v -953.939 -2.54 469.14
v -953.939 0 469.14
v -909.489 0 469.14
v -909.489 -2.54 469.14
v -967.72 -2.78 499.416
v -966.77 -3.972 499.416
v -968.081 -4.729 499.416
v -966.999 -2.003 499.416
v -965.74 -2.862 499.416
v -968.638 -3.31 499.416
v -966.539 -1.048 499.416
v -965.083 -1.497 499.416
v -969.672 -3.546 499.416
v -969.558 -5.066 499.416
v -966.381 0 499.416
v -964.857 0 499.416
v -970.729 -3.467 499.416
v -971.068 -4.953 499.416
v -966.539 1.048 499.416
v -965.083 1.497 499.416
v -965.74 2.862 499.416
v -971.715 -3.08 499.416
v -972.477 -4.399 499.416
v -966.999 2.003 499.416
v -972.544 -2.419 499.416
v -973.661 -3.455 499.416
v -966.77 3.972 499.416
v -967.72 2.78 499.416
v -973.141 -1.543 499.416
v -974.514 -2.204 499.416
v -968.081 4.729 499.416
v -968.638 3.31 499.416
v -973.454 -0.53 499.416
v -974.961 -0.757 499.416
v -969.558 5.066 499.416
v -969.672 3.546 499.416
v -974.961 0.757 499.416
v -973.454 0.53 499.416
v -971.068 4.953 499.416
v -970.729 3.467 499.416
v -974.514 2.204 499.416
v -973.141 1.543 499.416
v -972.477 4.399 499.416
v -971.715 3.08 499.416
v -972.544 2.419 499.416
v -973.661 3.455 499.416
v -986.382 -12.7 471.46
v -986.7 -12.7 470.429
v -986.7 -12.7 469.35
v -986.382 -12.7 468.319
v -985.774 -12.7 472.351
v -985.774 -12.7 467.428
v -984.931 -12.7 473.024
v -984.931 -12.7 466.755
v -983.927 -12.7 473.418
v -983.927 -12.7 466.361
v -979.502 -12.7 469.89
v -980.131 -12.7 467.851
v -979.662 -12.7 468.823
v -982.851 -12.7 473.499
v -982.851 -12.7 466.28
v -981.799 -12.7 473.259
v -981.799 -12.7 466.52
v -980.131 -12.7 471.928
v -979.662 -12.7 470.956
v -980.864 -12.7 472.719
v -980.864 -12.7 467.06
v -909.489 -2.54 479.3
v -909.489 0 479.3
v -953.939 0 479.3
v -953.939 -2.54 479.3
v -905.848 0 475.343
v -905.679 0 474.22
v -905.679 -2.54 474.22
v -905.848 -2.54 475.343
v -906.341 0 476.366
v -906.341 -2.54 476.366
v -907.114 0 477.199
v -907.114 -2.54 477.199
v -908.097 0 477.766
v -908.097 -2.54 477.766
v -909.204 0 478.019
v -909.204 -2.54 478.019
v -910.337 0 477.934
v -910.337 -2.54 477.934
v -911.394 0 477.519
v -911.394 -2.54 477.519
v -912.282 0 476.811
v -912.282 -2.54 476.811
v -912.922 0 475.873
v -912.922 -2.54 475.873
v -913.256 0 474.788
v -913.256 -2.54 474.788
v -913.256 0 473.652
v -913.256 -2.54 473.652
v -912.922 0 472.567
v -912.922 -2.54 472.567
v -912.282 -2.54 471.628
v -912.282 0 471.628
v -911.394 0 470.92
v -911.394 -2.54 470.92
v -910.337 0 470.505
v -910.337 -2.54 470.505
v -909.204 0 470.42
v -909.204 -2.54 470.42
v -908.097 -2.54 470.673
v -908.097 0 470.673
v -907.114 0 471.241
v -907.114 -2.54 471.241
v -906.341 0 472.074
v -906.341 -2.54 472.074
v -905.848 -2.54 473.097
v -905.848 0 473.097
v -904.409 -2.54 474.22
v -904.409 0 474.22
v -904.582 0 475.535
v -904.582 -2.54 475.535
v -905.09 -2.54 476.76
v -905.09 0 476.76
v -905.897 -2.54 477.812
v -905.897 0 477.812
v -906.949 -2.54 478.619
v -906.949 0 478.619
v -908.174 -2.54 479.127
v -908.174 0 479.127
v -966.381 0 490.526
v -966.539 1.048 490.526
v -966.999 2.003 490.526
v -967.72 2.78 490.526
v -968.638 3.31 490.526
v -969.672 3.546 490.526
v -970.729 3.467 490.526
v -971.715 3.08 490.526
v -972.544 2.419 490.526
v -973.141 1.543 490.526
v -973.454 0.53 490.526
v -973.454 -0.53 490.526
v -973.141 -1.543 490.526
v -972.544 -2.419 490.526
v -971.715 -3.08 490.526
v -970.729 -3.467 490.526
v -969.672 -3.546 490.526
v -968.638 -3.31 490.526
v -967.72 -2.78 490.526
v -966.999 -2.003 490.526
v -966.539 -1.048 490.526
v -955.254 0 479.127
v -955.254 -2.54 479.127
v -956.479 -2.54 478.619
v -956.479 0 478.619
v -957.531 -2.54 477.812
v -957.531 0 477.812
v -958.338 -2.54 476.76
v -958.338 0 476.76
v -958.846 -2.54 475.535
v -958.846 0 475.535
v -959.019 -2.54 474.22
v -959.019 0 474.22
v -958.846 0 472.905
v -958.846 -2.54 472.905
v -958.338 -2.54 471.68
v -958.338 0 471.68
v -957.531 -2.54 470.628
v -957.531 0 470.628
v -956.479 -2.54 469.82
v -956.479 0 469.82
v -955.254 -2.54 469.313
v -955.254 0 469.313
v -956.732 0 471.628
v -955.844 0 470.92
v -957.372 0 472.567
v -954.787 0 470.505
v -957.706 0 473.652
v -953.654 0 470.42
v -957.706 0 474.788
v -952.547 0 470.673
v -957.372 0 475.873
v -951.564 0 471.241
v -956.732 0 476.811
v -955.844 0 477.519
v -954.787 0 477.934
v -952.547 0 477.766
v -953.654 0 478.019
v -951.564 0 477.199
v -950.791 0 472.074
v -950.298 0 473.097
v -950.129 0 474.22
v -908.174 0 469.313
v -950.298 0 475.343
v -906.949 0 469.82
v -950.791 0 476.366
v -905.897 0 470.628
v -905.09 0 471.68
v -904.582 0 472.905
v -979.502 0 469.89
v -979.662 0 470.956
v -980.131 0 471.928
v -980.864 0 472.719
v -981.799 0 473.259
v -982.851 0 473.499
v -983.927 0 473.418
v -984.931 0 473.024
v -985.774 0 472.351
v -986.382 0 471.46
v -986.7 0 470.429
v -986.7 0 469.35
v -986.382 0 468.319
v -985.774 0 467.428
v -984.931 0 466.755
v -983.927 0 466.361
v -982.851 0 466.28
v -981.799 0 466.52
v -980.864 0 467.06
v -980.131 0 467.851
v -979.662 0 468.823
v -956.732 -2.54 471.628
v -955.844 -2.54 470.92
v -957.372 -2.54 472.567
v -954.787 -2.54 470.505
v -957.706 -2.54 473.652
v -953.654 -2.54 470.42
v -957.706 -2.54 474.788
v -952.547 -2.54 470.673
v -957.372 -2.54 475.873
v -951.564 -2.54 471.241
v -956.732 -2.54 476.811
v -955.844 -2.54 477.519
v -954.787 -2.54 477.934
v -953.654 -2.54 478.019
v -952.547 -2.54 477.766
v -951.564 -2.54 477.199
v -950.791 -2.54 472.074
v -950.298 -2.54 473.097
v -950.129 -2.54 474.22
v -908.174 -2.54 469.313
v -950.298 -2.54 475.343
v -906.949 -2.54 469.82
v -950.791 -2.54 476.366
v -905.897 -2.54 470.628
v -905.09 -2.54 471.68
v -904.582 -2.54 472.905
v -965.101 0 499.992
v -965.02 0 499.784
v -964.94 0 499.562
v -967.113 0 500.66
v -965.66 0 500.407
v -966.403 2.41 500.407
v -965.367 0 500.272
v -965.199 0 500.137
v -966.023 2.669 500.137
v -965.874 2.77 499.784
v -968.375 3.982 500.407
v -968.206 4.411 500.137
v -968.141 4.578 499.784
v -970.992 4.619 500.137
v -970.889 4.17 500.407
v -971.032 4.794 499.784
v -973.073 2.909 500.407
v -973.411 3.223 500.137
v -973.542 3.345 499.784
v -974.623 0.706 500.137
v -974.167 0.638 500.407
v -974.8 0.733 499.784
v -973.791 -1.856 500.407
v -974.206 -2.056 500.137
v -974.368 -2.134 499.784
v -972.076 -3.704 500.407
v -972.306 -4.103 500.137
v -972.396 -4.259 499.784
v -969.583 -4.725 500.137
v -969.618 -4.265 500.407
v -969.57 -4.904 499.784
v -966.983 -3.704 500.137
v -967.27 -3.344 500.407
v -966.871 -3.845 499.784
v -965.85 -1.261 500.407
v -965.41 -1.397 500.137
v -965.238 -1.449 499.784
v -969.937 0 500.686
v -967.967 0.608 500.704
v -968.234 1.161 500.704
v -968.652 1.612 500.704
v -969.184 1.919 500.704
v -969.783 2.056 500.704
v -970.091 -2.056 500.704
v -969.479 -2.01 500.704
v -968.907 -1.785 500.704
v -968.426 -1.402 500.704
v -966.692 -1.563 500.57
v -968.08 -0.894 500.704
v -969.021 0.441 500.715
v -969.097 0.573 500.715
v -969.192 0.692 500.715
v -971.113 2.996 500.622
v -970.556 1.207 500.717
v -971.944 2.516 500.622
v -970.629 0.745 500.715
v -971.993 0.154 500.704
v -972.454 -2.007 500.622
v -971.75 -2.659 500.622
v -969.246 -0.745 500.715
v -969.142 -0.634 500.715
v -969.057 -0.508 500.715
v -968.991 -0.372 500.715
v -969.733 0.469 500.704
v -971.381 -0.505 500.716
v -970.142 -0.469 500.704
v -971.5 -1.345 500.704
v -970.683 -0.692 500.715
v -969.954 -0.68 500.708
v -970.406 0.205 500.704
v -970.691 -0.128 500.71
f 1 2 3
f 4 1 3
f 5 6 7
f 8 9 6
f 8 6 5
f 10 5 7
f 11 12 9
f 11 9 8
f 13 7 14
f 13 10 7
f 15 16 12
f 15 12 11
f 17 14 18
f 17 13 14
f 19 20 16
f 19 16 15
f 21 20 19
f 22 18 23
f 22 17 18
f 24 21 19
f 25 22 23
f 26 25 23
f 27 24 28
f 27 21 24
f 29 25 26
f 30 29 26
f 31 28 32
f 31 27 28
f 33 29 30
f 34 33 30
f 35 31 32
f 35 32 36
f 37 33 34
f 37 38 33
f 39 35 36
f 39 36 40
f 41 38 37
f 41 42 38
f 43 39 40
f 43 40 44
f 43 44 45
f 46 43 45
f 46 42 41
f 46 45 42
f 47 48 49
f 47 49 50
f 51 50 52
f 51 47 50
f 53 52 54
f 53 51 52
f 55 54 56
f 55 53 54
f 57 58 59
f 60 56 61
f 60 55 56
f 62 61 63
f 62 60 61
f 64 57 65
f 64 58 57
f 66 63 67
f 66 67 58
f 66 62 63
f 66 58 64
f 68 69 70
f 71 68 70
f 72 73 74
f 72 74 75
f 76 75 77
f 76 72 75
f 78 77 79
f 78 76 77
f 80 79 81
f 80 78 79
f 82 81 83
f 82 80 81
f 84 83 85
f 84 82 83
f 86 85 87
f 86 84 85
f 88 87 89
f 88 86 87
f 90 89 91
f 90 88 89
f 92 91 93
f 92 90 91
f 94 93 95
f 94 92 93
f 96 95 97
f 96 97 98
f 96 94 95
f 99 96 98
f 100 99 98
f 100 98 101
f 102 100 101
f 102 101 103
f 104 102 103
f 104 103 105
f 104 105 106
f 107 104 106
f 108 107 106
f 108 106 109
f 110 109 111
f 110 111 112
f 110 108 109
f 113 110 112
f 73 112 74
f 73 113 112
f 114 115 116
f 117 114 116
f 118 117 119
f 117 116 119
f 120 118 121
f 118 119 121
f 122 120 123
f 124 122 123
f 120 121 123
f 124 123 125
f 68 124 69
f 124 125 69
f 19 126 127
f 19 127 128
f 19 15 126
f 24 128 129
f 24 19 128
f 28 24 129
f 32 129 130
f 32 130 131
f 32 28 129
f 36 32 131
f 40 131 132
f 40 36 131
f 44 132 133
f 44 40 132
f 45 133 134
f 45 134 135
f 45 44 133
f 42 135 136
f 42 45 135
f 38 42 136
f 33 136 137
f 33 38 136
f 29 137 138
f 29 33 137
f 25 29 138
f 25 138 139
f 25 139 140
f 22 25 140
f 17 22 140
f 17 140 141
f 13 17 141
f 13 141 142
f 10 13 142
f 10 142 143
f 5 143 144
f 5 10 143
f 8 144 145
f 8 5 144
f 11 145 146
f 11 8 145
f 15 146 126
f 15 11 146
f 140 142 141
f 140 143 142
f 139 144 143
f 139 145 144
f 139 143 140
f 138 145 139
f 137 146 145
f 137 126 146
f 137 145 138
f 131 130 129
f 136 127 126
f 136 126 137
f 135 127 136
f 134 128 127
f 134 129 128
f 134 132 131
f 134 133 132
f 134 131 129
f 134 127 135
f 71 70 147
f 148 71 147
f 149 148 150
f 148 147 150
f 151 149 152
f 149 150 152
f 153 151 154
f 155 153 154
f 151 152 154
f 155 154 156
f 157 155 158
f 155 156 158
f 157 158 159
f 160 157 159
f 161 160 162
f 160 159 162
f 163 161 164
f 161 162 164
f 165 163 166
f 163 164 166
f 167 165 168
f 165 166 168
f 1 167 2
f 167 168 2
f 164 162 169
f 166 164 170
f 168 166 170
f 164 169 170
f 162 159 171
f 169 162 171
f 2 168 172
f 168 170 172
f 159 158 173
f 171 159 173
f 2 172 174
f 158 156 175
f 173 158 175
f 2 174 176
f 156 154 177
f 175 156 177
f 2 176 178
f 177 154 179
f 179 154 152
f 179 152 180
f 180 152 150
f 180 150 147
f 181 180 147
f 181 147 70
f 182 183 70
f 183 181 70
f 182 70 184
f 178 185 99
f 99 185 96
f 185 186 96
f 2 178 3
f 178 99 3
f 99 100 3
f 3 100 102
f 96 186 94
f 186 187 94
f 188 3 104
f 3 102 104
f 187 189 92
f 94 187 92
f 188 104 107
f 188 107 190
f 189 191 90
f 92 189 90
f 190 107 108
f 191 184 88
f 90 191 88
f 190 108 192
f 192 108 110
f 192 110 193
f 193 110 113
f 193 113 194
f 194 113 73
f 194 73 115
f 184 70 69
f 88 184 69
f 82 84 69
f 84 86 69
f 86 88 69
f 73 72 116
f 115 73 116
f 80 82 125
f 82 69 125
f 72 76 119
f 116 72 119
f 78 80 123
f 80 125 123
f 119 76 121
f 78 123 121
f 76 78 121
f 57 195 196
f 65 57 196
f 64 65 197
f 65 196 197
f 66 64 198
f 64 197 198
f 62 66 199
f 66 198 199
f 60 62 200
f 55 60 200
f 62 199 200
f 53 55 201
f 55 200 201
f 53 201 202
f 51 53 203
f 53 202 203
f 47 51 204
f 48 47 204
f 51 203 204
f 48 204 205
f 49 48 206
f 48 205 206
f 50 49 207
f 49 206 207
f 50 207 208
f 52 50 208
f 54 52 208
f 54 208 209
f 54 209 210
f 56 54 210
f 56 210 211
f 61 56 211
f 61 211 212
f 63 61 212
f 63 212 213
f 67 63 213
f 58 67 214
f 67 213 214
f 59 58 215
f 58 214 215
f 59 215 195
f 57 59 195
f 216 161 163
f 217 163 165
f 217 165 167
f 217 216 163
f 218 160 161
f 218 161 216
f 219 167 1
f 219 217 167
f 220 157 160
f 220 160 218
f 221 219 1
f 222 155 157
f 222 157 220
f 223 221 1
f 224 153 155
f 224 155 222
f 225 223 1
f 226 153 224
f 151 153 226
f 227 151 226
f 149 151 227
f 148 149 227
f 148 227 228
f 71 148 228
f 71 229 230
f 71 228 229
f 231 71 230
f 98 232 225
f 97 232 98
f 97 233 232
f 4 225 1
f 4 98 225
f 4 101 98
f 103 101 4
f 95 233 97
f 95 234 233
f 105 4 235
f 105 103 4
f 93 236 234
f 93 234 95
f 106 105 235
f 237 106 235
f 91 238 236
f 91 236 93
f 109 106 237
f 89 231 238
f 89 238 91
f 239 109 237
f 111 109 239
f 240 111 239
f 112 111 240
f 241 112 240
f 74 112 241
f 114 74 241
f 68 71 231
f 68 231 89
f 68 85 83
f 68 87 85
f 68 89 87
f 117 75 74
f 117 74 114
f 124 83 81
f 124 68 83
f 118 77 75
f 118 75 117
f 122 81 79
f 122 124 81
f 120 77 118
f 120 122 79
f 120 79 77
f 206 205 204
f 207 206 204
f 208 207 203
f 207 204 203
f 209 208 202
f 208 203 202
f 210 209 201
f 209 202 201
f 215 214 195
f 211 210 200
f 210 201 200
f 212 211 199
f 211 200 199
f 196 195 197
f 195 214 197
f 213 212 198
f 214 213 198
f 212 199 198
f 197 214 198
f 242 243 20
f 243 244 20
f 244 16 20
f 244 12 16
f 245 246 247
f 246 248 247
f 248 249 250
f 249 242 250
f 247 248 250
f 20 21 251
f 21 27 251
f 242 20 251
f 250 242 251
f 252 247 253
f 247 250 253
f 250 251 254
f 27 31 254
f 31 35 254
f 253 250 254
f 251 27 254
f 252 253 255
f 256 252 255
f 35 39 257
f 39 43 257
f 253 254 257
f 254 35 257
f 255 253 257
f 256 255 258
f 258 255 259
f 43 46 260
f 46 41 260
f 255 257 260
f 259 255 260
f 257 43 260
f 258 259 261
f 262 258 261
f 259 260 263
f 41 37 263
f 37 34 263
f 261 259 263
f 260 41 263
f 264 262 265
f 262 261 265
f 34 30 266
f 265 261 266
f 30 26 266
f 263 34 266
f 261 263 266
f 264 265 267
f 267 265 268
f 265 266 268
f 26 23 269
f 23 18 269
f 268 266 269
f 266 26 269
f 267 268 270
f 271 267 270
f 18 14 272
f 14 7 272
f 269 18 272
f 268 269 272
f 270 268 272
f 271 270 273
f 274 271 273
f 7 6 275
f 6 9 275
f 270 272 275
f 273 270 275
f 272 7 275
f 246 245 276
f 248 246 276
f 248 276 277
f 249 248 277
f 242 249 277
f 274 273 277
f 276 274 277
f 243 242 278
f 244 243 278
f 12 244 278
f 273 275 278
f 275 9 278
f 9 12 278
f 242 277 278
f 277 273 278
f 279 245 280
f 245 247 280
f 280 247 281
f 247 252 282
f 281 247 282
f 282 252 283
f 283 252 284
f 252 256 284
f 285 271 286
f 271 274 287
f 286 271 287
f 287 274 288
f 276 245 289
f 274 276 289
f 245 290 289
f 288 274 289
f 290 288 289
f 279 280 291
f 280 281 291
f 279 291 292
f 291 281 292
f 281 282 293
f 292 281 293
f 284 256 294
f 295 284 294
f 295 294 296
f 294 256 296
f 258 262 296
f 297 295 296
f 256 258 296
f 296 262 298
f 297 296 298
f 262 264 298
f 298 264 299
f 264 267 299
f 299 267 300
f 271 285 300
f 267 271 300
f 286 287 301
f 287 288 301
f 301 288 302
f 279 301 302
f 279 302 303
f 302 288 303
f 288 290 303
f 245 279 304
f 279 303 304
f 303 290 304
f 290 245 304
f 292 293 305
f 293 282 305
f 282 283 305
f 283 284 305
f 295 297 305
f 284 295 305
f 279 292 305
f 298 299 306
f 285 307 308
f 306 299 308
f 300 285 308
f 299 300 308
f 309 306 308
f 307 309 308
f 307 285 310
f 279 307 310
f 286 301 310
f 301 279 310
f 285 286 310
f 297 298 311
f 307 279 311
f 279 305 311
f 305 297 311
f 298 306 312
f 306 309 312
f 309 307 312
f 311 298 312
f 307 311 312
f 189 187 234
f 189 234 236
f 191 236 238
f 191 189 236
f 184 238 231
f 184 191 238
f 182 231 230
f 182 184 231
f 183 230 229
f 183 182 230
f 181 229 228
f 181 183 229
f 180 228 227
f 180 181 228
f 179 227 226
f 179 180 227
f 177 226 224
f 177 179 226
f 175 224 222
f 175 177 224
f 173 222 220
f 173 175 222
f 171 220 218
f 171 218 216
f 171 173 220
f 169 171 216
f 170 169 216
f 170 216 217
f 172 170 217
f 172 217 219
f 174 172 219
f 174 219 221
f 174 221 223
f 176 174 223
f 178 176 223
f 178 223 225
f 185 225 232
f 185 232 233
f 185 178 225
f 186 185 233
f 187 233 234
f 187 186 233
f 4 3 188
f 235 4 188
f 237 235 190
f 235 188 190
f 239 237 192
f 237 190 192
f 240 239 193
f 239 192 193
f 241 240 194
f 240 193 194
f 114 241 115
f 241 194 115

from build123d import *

# Parameters (mm, degrees)
F0_R     = 3.6195
F1_DEPTH = 12.7
F0_R_2   = 3.81
F2_DEPTH = 2.54
F3_W     = 3.556
F3_H     = 8.89


with BuildPart() as f1:
    # F0 (on Front) → F1 (new body)
    with BuildSketch(Plane.XZ):
        with Locations((-983.1210970879, 469.8895514011)):
            Circle(F0_R)
    extrude(amount=F1_DEPTH)


with BuildPart() as f2:
    # F0 (on Front) → F2 (new body)
    with BuildSketch(Plane.XZ):
        with BuildLine():
            ThreePointArc((-948.8590052986, 474.2197547722), (-950.3469028502, 477.8118572206), (-953.9390052986, 479.2997547722))
            ThreePointArc((-953.9390052986, 479.2997547722), (-957.531107747, 477.8118572206), (-959.0190052986, 474.2197547722))
            ThreePointArc((-959.0190052986, 474.2197547722), (-957.531107747, 470.6276523238), (-953.9390052986, 469.1397547722))
            ThreePointArc((-953.9390052986, 469.1397547722), (-950.3469028502, 470.6276523238), (-948.8590052986, 474.2197547722))
        make_face()
        with Locations((-953.9390052986, 474.2197547722)):
            Circle(F0_R_2, mode=Mode.SUBTRACT)
        with BuildLine():
            ThreePointArc((-904.4090052986, 474.2197547722), (-905.8969028502, 477.8118572206), (-909.4890052986, 479.2997547722))
            ThreePointArc((-909.4890052986, 479.2997547722), (-914.5690052986, 474.2197547722), (-909.4890052986, 469.1397547722))
            ThreePointArc((-909.4890052986, 469.1397547722), (-905.8969028502, 470.6276523238), (-904.4090052986, 474.2197547722))
        make_face()
        with Locations((-909.4890052986, 474.2197547722)):
            Circle(F0_R_2, mode=Mode.SUBTRACT)
        with BuildLine():
            Line((-909.4890052986, 479.2997547722), (-953.9390052986, 479.2997547722))
            ThreePointArc((-953.9390052986, 479.2997547722), (-950.3469028502, 477.8118572206), (-948.8590052986, 474.2197547722))
            ThreePointArc((-948.8590052986, 474.2197547722), (-950.3469028502, 470.6276523238), (-953.9390052986, 469.1397547722))
            Line((-953.9390052986, 469.1397547722), (-909.4890052986, 469.1397547722))
            ThreePointArc((-909.4890052986, 469.1397547722), (-914.5690052986, 474.2197547722), (-909.4890052986, 479.2997547722))
        make_face()
    extrude(amount=F2_DEPTH)


with BuildPart() as f4:
    # F3 (on Front) → F4 (revolve)
    with BuildSketch(Plane.XZ):
        with Locations((-968.1593871795, 494.9707962078)):
            Rectangle(F3_W, F3_H)
        with BuildLine():
            Line((-969.9373871795, 500.6857962078), (-969.9373871795, 499.4157962078))
            Line((-969.9373871795, 499.4157962078), (-966.3813871795, 499.4157962078))
            Line((-966.3813871795, 499.4157962078), (-964.8573871795, 499.4157962078))
            add(Edge.make_bspline(
                [(-969.9373871795, 500.6857962078), (-969.1245044775, 500.7170094046), (-967.6671861669, 500.7566544174), (-964.9724624884, 500.4477607725), (-965.0309068325, 499.6556125528), (-964.8573871795, 499.4157962078)],
                knots=[0, 0, 0, 0, 0.3910652847, 0.7717389314, 1, 1, 1, 1], degree=3))
        make_face()
    revolve(axis=Axis((-969.9373871795, 0, 500.0507962078), (0, 0, 1)))


solid = Compound([f1.part, f2.part, f4.part])
